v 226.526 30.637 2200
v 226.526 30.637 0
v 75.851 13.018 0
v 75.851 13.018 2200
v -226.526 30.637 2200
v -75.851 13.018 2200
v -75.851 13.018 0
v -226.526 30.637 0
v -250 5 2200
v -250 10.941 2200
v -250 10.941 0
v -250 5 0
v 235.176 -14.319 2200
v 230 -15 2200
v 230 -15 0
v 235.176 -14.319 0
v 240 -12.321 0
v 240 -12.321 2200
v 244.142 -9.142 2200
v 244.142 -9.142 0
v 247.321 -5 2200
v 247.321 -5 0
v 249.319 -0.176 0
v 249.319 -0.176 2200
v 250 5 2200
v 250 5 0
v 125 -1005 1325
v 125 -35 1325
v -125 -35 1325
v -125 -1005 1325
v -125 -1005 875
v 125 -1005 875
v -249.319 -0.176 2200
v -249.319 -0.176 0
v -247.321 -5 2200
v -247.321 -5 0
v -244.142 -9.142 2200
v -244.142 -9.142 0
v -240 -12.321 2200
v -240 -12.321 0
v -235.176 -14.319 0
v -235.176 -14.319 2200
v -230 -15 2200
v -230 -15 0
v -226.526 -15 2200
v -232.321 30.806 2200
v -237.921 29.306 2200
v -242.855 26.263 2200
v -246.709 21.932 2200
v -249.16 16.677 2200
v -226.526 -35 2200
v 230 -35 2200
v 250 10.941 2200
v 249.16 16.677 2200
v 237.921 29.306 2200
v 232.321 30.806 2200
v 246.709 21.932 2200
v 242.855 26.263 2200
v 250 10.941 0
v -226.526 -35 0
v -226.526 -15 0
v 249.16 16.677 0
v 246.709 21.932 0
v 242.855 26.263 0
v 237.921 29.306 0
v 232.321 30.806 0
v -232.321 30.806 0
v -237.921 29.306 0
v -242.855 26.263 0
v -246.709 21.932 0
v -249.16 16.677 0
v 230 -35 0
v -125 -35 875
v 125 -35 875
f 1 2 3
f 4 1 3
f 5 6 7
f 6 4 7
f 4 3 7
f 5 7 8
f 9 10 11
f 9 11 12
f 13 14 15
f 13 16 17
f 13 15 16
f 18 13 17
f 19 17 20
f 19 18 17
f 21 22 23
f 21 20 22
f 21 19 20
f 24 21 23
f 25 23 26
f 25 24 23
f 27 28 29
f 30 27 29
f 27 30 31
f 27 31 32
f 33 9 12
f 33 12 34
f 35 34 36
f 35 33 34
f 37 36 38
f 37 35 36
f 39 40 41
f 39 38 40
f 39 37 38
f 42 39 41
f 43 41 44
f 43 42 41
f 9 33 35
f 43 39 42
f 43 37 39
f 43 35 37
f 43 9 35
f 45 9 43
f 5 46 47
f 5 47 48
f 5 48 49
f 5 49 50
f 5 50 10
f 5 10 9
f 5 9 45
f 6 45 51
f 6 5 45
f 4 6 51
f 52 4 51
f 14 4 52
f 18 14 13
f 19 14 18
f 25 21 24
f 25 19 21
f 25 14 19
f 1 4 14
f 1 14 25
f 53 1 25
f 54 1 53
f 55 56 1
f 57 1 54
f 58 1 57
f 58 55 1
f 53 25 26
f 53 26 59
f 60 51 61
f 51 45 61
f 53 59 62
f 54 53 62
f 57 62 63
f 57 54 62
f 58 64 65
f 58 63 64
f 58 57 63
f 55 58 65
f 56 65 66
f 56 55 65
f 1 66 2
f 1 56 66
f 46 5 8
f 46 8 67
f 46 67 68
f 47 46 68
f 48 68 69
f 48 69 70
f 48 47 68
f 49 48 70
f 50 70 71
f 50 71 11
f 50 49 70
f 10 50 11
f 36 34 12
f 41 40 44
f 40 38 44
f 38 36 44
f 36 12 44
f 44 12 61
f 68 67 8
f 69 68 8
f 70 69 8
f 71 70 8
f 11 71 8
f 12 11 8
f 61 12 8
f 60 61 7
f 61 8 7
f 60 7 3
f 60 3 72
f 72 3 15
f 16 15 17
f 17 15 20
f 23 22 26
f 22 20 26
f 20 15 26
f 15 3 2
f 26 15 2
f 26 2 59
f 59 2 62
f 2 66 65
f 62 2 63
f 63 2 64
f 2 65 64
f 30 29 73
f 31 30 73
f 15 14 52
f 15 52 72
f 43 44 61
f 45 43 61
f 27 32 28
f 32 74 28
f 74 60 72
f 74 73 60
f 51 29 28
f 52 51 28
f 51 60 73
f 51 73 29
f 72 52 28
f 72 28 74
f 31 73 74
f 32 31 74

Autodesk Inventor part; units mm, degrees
ref_plane "YZ Plane" through (0, 0, 0) normal (1, 0, 0) x (0, 1, 0)
ref_plane "XZ Plane" through (0, 0, 0) normal (0, 1, 0) x (-1, 0, 0)
ref_plane "XY Plane" through (0, 0, 0) normal (0, 0, 1) x (1, 0, 0)
sketch "Sketch1" plane through (0, 0, 0) normal (0, 0, 1) x (1, 0, 0)
  line L0 (-250, -15) -> (250, -15)
  line L1 (250, -15) -> (250, 35)
  line L2 (-250, 35) -> (-250, -15)
  line L3 (-250, -15) -> (250, 35) construction
  line L4 (250, -15) -> (-250, 35) construction
  arc A0 (-250, 35) -> (250, 35) centre (0, 1314.7822) ccw
  point P0 (0, 10)
  dimension "d6" = 500
  dimension "d7" = 50
extrude "Extrusion1" add sketch "Sketch1" along normal blind 2200
fillet "Fillet1" radius 20 1 edges at (250, 35, 1100)
fillet "Fillet2" radius 20 1 edges at (250, -15, 1100)
fillet "Fillet3" radius 20 2 edges at (-250, 35, 1100) (-250, -15, 1100)
sketch "Sketch2" plane through (230, -15, 0) normal (0, -1, 0) x (1, 0, 0)
  line L0 (0, 2200) -> (0, 0) projected
  line L1 (-456.5256, 0) -> (-3.4744, 0) projected
  line L2 (0, 2200) -> (-456.5256, 2200)
  line L3 (-456.5256, 2200) -> (-456.5256, 0)
  line L4 (-456.5256, 0) -> (0, 0)
  line L5 (0, 0) -> (0, 2200)
  line L6 (-103.2628, 1325) -> (-353.2628, 1325)
  line L7 (-353.2628, 1325) -> (-353.2628, 875)
  line L8 (-353.2628, 875) -> (-103.2628, 875)
  line L9 (-103.2628, 875) -> (-103.2628, 1325)
  line L10 (-103.2628, 1325) -> (-353.2628, 875) construction
  line L11 (-353.2628, 1325) -> (-103.2628, 875) construction
  point P0 (-230, 0)
  point P1 (-228.2628, 1100)
  dimension "d15" = 250
  dimension "d16" = 450
extrude "Extrusion2" add sketch "Sketch2" along normal blind 20 contours L0 L4 L1 L3 L2 | L9 L8 L7 L6
sketch "Sketch3" plane through (230, -35, 0) normal (0, -1, 0) x (1, 0, 0)
  point P0 (-230, 0)
sketch "Sketch4" plane through (230, -35, 0) normal (0, -1, 0) x (1, 0, 0)
  line L0 (-105, 1325) -> (-355, 1325)
  line L1 (-355, 1325) -> (-355, 875)
  line L2 (-355, 875) -> (-105, 875)
  line L3 (-105, 875) -> (-105, 1325)
  line L4 (-105, 1325) -> (-355, 875) construction
  line L5 (-355, 1325) -> (-105, 875) construction
  point P0 (-230, 0)
  point P1 (-230, 1100)
  dimension "d17" = 250
  dimension "d18" = 450
extrude "Extrusion3" add sketch "Sketch4" along normal blind 970
properties part number "Patient_table"
